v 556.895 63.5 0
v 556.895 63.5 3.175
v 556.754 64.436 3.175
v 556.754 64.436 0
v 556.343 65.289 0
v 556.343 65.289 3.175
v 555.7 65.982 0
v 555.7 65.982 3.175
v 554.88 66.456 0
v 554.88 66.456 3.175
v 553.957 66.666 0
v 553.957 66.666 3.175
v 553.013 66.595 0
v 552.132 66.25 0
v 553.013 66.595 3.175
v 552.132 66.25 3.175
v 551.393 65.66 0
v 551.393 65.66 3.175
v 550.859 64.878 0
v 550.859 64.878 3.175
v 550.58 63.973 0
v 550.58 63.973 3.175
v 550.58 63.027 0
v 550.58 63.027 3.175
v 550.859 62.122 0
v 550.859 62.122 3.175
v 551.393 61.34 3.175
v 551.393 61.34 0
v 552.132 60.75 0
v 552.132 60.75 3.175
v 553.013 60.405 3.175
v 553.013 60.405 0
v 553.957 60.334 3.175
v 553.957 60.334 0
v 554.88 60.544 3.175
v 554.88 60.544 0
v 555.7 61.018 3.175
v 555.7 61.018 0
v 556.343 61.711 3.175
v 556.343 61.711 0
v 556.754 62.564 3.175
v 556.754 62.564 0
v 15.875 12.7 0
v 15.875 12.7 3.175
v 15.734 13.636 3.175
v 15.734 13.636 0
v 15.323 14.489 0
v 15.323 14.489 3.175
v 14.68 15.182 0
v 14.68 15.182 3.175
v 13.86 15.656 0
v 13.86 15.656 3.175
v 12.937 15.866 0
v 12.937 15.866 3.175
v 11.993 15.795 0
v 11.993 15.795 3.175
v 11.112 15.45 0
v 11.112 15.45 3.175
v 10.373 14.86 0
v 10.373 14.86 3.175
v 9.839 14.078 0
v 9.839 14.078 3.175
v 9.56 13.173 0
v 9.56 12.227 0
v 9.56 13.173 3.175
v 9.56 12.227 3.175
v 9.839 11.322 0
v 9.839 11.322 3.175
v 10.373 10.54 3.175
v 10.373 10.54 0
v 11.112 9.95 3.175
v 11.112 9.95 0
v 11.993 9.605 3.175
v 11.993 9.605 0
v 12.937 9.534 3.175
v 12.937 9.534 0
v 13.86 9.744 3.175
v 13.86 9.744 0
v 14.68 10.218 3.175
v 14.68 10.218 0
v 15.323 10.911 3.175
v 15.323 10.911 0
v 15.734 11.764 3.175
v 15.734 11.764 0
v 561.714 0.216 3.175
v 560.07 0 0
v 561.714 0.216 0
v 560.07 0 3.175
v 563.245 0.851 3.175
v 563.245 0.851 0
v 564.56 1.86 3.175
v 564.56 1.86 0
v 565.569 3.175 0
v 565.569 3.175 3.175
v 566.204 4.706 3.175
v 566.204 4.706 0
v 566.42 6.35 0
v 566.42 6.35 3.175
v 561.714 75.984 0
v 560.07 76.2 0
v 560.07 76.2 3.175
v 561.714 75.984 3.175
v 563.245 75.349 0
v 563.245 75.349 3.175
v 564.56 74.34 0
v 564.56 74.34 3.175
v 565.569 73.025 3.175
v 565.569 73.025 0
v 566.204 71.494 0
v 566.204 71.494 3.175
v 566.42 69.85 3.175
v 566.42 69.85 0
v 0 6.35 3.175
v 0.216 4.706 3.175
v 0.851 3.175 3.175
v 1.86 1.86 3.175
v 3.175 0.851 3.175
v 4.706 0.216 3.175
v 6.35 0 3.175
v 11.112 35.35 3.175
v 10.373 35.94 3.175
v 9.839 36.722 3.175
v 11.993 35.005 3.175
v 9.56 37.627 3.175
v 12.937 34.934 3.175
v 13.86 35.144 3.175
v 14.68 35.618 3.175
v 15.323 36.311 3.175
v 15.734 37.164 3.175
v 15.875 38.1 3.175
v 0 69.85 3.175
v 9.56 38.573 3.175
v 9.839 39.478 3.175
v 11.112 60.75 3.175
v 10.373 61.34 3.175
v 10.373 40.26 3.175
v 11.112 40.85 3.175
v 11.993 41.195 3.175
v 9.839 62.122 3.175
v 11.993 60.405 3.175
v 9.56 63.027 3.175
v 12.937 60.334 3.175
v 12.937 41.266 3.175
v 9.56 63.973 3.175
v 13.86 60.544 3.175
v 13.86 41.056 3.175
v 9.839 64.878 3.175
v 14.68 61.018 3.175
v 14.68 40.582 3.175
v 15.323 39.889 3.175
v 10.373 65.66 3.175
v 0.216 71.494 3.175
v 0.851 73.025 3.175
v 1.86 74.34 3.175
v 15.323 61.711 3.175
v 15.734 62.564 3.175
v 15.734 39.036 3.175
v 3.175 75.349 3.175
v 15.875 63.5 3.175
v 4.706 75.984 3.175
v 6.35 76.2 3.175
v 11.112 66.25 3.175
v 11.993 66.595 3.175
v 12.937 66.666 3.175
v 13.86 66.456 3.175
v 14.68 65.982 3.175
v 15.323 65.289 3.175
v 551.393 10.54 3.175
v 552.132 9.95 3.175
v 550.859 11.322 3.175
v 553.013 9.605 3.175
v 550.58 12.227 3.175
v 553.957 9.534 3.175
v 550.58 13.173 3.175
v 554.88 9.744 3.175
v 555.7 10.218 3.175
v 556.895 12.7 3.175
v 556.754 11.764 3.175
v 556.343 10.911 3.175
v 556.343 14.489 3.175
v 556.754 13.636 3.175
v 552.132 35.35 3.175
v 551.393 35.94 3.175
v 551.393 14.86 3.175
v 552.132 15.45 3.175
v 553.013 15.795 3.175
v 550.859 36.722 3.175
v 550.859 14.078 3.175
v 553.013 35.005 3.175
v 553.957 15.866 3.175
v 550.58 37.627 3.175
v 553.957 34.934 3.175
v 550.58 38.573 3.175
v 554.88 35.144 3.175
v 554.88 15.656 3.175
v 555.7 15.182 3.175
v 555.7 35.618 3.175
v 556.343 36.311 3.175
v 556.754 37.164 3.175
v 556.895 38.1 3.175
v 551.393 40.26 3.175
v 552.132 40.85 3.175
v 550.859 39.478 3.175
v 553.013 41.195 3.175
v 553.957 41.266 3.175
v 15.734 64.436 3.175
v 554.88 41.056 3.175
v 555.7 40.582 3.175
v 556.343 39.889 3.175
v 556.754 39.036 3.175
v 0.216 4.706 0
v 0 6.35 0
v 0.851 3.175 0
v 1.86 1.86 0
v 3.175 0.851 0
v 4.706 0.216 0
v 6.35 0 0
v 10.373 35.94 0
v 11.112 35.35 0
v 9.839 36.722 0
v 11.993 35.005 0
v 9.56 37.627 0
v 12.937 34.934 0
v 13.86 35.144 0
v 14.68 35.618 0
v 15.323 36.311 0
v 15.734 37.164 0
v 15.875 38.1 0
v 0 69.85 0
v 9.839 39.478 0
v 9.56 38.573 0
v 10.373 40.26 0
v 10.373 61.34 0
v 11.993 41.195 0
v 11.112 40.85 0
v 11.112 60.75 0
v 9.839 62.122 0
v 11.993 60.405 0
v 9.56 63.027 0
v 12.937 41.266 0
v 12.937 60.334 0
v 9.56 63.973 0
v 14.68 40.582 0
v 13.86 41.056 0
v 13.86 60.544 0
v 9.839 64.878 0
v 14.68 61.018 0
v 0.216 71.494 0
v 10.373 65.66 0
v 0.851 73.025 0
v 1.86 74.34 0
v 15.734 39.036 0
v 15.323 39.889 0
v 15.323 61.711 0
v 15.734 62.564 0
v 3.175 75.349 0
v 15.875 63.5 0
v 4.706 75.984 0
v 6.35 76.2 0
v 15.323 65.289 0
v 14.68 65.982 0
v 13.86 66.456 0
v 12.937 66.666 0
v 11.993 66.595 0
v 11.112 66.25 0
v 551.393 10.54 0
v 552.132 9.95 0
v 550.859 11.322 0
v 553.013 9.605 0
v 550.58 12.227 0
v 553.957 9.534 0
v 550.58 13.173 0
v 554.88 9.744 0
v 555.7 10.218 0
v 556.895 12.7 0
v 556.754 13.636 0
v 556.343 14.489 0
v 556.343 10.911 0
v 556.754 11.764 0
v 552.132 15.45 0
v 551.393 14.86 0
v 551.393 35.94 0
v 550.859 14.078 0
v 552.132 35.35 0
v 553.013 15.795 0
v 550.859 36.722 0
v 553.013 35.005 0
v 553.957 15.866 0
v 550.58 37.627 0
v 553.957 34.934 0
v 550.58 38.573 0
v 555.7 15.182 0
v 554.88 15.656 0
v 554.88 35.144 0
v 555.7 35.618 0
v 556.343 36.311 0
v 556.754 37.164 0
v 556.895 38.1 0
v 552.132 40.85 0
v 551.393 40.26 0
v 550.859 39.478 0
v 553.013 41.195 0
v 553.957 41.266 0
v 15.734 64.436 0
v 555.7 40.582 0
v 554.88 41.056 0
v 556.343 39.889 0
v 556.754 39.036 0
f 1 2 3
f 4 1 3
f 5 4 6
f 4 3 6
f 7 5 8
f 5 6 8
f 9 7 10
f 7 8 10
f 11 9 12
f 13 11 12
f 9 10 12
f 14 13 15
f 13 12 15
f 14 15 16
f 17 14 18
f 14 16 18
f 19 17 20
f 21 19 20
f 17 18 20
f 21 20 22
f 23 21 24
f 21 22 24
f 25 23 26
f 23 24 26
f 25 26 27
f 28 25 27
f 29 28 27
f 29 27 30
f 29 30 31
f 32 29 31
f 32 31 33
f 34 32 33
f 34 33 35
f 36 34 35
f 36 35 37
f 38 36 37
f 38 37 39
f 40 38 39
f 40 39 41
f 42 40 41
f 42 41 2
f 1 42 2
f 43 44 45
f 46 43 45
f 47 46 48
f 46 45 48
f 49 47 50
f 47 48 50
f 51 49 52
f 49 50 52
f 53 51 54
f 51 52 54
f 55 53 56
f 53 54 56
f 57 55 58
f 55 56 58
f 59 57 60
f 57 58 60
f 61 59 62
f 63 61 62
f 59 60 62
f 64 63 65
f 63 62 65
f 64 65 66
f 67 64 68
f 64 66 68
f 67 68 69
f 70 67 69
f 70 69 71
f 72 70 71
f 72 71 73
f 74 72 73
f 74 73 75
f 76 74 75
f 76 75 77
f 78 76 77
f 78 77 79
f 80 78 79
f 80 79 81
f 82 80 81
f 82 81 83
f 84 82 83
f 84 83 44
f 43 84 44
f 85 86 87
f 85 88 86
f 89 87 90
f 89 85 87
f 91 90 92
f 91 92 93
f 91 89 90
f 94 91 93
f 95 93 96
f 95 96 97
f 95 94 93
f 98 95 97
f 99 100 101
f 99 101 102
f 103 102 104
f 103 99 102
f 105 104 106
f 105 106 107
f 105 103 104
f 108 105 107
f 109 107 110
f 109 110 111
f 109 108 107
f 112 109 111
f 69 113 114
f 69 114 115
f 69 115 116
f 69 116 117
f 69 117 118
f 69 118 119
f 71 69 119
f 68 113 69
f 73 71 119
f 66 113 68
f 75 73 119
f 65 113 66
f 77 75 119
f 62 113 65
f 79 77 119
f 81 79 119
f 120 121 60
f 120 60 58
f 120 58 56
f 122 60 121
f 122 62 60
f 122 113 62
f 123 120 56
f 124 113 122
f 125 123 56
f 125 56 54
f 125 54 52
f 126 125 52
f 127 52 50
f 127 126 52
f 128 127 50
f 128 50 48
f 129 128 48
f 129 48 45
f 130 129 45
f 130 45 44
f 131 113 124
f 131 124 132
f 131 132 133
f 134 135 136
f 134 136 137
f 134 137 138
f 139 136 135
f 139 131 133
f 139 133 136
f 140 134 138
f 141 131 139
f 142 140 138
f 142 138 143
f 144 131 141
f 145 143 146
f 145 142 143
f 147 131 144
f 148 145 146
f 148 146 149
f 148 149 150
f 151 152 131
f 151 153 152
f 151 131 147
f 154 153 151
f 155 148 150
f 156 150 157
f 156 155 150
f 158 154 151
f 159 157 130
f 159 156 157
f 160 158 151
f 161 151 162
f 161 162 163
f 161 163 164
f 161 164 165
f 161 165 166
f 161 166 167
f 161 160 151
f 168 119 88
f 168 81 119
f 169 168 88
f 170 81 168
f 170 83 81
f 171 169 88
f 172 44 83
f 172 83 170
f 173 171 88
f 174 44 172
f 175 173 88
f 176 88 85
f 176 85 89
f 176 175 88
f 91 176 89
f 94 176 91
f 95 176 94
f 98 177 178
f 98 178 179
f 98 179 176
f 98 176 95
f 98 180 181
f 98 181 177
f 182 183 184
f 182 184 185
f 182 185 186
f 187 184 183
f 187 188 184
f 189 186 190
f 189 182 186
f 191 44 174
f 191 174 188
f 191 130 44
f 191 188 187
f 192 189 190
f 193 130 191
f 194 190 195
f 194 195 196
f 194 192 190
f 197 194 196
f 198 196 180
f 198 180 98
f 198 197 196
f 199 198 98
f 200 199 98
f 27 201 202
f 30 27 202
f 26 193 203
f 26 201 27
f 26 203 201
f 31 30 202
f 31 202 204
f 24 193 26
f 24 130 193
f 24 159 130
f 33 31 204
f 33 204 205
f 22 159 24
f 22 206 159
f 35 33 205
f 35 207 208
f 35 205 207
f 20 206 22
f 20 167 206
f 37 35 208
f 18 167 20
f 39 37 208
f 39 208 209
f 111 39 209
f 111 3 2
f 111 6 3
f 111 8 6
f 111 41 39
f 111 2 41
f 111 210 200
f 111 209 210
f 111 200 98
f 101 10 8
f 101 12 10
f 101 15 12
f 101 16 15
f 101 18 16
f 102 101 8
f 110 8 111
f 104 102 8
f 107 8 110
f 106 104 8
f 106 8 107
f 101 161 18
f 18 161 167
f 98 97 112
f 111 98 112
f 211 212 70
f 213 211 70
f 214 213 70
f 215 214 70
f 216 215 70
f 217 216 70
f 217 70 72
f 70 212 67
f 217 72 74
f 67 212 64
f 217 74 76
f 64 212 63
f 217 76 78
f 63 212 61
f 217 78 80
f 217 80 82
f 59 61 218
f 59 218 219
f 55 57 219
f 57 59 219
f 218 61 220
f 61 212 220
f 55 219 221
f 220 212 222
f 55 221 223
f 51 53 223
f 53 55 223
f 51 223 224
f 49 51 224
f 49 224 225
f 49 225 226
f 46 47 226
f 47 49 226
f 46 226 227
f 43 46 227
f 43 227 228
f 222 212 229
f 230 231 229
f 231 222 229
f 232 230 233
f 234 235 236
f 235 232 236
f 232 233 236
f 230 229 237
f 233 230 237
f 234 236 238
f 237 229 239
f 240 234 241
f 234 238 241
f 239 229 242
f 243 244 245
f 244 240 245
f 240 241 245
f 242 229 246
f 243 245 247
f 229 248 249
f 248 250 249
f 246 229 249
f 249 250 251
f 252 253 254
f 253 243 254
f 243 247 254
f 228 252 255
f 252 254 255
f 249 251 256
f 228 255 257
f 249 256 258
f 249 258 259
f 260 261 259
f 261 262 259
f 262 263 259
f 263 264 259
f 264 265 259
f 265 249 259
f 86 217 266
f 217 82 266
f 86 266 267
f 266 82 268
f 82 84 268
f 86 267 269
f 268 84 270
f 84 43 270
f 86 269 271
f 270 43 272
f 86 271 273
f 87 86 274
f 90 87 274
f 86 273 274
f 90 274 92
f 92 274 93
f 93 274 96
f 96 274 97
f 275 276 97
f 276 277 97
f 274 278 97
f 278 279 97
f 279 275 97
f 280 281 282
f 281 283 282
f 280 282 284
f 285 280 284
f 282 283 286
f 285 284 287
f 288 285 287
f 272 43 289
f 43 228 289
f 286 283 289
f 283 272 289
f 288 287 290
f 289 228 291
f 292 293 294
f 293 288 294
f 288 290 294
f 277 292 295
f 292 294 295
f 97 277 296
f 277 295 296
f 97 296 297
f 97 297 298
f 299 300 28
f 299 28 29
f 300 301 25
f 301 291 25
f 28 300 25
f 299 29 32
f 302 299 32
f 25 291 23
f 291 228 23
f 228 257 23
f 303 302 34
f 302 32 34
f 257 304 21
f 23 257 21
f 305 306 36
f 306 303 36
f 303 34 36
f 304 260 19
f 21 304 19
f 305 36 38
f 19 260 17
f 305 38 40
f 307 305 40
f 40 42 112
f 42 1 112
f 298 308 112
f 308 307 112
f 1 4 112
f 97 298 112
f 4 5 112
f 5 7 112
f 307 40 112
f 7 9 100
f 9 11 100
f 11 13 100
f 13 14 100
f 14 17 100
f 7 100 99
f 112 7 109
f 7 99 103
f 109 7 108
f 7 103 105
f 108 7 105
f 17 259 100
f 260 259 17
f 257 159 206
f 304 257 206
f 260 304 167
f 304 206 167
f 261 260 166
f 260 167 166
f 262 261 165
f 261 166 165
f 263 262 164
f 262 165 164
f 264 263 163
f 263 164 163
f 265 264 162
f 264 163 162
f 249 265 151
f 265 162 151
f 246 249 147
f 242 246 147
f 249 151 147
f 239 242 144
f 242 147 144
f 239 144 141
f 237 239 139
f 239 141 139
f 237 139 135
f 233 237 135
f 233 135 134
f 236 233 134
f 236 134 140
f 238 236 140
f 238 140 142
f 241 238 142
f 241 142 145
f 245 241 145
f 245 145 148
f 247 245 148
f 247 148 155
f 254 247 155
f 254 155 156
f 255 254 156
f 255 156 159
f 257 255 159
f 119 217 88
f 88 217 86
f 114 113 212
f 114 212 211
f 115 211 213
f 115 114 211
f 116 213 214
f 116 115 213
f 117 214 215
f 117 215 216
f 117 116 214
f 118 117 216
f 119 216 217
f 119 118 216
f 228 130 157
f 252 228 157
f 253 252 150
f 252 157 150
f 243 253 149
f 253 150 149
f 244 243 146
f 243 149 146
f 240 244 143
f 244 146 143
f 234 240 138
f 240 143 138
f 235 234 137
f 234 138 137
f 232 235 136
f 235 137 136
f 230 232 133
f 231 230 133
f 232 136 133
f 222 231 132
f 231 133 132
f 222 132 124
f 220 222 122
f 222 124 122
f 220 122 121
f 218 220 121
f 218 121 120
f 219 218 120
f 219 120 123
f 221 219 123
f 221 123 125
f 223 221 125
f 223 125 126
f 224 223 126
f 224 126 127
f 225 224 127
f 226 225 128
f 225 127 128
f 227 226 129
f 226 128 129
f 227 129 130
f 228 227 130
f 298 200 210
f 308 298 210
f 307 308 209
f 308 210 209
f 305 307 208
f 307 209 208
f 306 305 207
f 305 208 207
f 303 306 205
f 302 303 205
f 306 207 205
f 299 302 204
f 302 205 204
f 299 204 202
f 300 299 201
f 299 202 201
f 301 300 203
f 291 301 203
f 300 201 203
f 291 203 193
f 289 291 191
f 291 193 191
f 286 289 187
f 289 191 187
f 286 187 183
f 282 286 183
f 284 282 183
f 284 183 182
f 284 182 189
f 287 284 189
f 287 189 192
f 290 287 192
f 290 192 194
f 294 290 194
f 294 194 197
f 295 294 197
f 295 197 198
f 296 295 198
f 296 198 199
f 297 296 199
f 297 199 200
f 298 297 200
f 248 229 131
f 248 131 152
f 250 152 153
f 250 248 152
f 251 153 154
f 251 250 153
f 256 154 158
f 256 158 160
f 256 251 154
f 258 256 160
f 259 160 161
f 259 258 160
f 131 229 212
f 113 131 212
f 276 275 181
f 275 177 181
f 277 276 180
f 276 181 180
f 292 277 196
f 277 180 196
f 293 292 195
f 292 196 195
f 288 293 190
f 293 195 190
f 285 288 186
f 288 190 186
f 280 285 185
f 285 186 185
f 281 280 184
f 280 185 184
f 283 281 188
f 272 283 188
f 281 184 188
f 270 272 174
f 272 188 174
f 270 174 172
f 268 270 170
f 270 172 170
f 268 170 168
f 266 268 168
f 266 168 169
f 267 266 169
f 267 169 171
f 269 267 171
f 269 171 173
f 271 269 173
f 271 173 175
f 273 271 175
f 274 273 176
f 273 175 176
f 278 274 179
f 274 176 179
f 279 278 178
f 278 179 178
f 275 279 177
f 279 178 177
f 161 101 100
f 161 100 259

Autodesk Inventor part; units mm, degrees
ref_plane "YZ Plane" through (0, 0, 0) normal (1, 0, 0) x (0, 1, 0)
ref_plane "XZ Plane" through (0, 0, 0) normal (0, 1, 0) x (-1, 0, 0)
ref_plane "XY Plane" through (0, 0, 0) normal (0, 0, 1) x (1, 0, 0)
sketch "Sketch1" plane through (0, 0, 0) normal (0, 0, 1) x (1, 0, 0)
  line L0 (0, 0) -> (566.42, 0)
  line L1 (566.42, 0) -> (566.42, 330.2)
  line L2 (566.42, 330.2) -> (0, 330.2)
  line L3 (0, 330.2) -> (0, 0)
  dimension "d0" = 330.2
  dimension "d1" = 566.42
extrude "Extrusion1" add sketch "Sketch1" along normal blind 3.175
sketch "Sketch3" plane through (0, 0, 3.175) normal (0, 0, 1) x (1, 0, 0)
  line L0 (566.42, 330.2) -> (553.72, 330.2)
  line L1 (553.72, 330.2) -> (553.72, 317.5)
  line L2 (553.72, 317.5) -> (566.42, 317.5)
  line L3 (566.42, 317.5) -> (566.42, 330.2)
  circle A0 centre (553.72, 317.5) radius 3.175
  point P0 (0, 0)
  dimension "d4" = 12.7
  dimension "d5" = 12.7
  dimension "d6" = 6.35
extrude "Extrusion2" cut sketch "Sketch3" against normal through all contours A0 L2 L1 | L1 L2 A0
pattern_linear "Rectangular Pattern1" count 5 spacing 76.2 along (0, -1, 0) count 2 spacing 541.02 along (-1, 0, 0) of "Extrusion2"
sketch "Sketch4" plane through (0, 0, 3.175) normal (0, 0, 1) x (1, 0, 0)
  line L0 (566.42, 330.2) -> (553.72, 330.2)
  line L1 (553.72, 330.2) -> (553.72, 266.7)
  line L2 (553.72, 266.7) -> (566.42, 266.7)
  line L3 (566.42, 266.7) -> (566.42, 330.2)
  circle A0 centre (553.72, 266.7) radius 6.35
  point P0 (0, 0)
  dimension "d15" = 12.7
  dimension "d16" = 63.5
  dimension "d17" = 12.7
extrude "Extrusion3" cut sketch "Sketch4" against normal through all contours A0 L2 L1 | L1 L2 A0
pattern_linear "Rectangular Pattern2" count 2 spacing 541.02 along (-1, 0, 0) of "Extrusion3"
sketch "Sketch6" plane through (0, 0, 3.175) normal (0, 0, 1) x (1, 0, 0)
  line L0 (566.42, 0) -> (566.42, 330.2) projected
  line L1 (0, 0) -> (566.42, 0)
  line L2 (566.42, 0) -> (566.42, 76.2)
  line L3 (566.42, 76.2) -> (0, 76.2)
  line L4 (0, 76.2) -> (0, 0)
  line L5 (0, 76.2) -> (566.42, 76.2)
  line L6 (566.42, 76.2) -> (566.42, 330.2)
  line L7 (566.42, 330.2) -> (0, 330.2)
  line L8 (0, 330.2) -> (0, 76.2)
  dimension "d23" = 76.2
extrude "Extrusion4" cut sketch "Sketch6" against normal through all contours L3 L8 L7 L0
sketch "Sketch7" plane through (0, 0, 3.175) normal (0, 0, 1) x (1, 0, 0)
  line L0 (0, 0) -> (566.42, 0) projected
  line L1 (283.21, 0) -> (283.21, 76.2)
  line L2 (566.42, 76.2) -> (0, 76.2) projected
  line L3 (283.21, 76.2) -> (389.89, 76.2)
  line L4 (389.89, 76.2) -> (176.53, 76.2)
  line L5 (176.53, 76.2) -> (176.53, 63.5)
  line L6 (389.89, 76.2) -> (389.89, 63.5)
  circle A0 centre (176.53, 63.5) radius 3.175
  circle A1 centre (389.89, 63.5) radius 3.175
  line L7 (176.53, 63.5) -> (176.53, 18.796)
  circle A2 centre (176.53, 18.796) radius 3.175
  circle A3 centre (389.89, 18.796) radius 3.175
  dimension "d26" = 106.68
  dimension "d27" = 213.36
  dimension "d28" = 12.7
  dimension "d29" = 12.7
  dimension "d30" = 6.35
  dimension "d31" = 6.35
  dimension "d34" = 44.704
  dimension "d35" = 6.35
extrude "Extrusion6" cut sketch "Sketch7" against normal through all
sketch "Sketch9" plane through (0, 0, 3.175) normal (0, 0, 1) x (1, 0, 0)
  circle A0 centre (12.7, 12.7) radius 3.175 projected
  line L0 (12.7, 12.7) -> (12.7, 38.1)
  line L1 (12.7, 38.1) -> (12.7, 63.5)
  circle A1 centre (12.7, 63.5) radius 3.175
  circle A2 centre (12.7, 38.1) radius 3.175
  line L2 (0, 0) -> (566.42, 0) projected
  line L3 (283.21, 0) -> (283.21, 76.2)
  line L4 (0, 76.2) -> (566.42, 76.2) projected
  circle A3 centre (553.72, 12.7) radius 3.175
  circle A4 centre (553.72, 63.5) radius 3.175
  circle A5 centre (553.72, 38.1) radius 3.175
  dimension "d45" = 25.4
  dimension "d46" = 25.4
  dimension "d47" = 6.35
  dimension "d48" = 6.35
extrude "Extrusion8" cut sketch "Sketch9" against normal through all contours A1 | A2 L1 L0 | L0 L1 A2 | A4 | A5
sketch "Sketch12" plane through (0, 0, 3.175) normal (0, 0, 1) x (1, 0, 0)
  line L0 (566.42, 76.2) -> (0, 76.2) projected
  line L1 (283.21, 76.2) -> (283.21, 0)
  line L2 (50.8, 57.15) -> (109.4994, 57.15)
  line L3 (80.1497, 57.15) -> (80.1497, 76.2)
  line L4 (0, 76.2) -> (0, 0) projected
  circle A0 centre (50.8, 57.15) radius 2.5019
  circle A1 centre (109.4994, 57.15) radius 2.5019
  circle A2 centre (515.62, 57.15) radius 2.5019
  circle A3 centre (456.9206, 57.15) radius 2.5019
  dimension "d85" = 19.05
  dimension "d86" = 58.6994
  dimension "d87" = 50.8
  dimension "d88" = 5.0038
  dimension "d89" = 5.0038
extrude "Extrusion11" cut sketch "Sketch12" against normal through all
fillet "Fillet1" radius 6.35 4 edges at (0, 76.2, 1.5875) (0, 0, 1.5875) (566.42, 76.2, 1.5875) (566.42, 0, 1.5875)
sketch "Sketch13" plane through (0, 0, 3.175) normal (0, 0, 1) x (1, 0, 0)
  line L0 (33.566, 68.6086) -> (529.2252, 68.6086)
  line L1 (529.2252, 68.6086) -> (529.2252, 9.2074)
  line L2 (529.2252, 9.2074) -> (33.566, 9.2074)
  line L3 (33.566, 9.2074) -> (33.566, 68.6086)
  point P0 (0, 0)
extrude "Extrusion12" add sketch "Sketch13" against normal blind 3.175
properties part number "Metal E-board"
